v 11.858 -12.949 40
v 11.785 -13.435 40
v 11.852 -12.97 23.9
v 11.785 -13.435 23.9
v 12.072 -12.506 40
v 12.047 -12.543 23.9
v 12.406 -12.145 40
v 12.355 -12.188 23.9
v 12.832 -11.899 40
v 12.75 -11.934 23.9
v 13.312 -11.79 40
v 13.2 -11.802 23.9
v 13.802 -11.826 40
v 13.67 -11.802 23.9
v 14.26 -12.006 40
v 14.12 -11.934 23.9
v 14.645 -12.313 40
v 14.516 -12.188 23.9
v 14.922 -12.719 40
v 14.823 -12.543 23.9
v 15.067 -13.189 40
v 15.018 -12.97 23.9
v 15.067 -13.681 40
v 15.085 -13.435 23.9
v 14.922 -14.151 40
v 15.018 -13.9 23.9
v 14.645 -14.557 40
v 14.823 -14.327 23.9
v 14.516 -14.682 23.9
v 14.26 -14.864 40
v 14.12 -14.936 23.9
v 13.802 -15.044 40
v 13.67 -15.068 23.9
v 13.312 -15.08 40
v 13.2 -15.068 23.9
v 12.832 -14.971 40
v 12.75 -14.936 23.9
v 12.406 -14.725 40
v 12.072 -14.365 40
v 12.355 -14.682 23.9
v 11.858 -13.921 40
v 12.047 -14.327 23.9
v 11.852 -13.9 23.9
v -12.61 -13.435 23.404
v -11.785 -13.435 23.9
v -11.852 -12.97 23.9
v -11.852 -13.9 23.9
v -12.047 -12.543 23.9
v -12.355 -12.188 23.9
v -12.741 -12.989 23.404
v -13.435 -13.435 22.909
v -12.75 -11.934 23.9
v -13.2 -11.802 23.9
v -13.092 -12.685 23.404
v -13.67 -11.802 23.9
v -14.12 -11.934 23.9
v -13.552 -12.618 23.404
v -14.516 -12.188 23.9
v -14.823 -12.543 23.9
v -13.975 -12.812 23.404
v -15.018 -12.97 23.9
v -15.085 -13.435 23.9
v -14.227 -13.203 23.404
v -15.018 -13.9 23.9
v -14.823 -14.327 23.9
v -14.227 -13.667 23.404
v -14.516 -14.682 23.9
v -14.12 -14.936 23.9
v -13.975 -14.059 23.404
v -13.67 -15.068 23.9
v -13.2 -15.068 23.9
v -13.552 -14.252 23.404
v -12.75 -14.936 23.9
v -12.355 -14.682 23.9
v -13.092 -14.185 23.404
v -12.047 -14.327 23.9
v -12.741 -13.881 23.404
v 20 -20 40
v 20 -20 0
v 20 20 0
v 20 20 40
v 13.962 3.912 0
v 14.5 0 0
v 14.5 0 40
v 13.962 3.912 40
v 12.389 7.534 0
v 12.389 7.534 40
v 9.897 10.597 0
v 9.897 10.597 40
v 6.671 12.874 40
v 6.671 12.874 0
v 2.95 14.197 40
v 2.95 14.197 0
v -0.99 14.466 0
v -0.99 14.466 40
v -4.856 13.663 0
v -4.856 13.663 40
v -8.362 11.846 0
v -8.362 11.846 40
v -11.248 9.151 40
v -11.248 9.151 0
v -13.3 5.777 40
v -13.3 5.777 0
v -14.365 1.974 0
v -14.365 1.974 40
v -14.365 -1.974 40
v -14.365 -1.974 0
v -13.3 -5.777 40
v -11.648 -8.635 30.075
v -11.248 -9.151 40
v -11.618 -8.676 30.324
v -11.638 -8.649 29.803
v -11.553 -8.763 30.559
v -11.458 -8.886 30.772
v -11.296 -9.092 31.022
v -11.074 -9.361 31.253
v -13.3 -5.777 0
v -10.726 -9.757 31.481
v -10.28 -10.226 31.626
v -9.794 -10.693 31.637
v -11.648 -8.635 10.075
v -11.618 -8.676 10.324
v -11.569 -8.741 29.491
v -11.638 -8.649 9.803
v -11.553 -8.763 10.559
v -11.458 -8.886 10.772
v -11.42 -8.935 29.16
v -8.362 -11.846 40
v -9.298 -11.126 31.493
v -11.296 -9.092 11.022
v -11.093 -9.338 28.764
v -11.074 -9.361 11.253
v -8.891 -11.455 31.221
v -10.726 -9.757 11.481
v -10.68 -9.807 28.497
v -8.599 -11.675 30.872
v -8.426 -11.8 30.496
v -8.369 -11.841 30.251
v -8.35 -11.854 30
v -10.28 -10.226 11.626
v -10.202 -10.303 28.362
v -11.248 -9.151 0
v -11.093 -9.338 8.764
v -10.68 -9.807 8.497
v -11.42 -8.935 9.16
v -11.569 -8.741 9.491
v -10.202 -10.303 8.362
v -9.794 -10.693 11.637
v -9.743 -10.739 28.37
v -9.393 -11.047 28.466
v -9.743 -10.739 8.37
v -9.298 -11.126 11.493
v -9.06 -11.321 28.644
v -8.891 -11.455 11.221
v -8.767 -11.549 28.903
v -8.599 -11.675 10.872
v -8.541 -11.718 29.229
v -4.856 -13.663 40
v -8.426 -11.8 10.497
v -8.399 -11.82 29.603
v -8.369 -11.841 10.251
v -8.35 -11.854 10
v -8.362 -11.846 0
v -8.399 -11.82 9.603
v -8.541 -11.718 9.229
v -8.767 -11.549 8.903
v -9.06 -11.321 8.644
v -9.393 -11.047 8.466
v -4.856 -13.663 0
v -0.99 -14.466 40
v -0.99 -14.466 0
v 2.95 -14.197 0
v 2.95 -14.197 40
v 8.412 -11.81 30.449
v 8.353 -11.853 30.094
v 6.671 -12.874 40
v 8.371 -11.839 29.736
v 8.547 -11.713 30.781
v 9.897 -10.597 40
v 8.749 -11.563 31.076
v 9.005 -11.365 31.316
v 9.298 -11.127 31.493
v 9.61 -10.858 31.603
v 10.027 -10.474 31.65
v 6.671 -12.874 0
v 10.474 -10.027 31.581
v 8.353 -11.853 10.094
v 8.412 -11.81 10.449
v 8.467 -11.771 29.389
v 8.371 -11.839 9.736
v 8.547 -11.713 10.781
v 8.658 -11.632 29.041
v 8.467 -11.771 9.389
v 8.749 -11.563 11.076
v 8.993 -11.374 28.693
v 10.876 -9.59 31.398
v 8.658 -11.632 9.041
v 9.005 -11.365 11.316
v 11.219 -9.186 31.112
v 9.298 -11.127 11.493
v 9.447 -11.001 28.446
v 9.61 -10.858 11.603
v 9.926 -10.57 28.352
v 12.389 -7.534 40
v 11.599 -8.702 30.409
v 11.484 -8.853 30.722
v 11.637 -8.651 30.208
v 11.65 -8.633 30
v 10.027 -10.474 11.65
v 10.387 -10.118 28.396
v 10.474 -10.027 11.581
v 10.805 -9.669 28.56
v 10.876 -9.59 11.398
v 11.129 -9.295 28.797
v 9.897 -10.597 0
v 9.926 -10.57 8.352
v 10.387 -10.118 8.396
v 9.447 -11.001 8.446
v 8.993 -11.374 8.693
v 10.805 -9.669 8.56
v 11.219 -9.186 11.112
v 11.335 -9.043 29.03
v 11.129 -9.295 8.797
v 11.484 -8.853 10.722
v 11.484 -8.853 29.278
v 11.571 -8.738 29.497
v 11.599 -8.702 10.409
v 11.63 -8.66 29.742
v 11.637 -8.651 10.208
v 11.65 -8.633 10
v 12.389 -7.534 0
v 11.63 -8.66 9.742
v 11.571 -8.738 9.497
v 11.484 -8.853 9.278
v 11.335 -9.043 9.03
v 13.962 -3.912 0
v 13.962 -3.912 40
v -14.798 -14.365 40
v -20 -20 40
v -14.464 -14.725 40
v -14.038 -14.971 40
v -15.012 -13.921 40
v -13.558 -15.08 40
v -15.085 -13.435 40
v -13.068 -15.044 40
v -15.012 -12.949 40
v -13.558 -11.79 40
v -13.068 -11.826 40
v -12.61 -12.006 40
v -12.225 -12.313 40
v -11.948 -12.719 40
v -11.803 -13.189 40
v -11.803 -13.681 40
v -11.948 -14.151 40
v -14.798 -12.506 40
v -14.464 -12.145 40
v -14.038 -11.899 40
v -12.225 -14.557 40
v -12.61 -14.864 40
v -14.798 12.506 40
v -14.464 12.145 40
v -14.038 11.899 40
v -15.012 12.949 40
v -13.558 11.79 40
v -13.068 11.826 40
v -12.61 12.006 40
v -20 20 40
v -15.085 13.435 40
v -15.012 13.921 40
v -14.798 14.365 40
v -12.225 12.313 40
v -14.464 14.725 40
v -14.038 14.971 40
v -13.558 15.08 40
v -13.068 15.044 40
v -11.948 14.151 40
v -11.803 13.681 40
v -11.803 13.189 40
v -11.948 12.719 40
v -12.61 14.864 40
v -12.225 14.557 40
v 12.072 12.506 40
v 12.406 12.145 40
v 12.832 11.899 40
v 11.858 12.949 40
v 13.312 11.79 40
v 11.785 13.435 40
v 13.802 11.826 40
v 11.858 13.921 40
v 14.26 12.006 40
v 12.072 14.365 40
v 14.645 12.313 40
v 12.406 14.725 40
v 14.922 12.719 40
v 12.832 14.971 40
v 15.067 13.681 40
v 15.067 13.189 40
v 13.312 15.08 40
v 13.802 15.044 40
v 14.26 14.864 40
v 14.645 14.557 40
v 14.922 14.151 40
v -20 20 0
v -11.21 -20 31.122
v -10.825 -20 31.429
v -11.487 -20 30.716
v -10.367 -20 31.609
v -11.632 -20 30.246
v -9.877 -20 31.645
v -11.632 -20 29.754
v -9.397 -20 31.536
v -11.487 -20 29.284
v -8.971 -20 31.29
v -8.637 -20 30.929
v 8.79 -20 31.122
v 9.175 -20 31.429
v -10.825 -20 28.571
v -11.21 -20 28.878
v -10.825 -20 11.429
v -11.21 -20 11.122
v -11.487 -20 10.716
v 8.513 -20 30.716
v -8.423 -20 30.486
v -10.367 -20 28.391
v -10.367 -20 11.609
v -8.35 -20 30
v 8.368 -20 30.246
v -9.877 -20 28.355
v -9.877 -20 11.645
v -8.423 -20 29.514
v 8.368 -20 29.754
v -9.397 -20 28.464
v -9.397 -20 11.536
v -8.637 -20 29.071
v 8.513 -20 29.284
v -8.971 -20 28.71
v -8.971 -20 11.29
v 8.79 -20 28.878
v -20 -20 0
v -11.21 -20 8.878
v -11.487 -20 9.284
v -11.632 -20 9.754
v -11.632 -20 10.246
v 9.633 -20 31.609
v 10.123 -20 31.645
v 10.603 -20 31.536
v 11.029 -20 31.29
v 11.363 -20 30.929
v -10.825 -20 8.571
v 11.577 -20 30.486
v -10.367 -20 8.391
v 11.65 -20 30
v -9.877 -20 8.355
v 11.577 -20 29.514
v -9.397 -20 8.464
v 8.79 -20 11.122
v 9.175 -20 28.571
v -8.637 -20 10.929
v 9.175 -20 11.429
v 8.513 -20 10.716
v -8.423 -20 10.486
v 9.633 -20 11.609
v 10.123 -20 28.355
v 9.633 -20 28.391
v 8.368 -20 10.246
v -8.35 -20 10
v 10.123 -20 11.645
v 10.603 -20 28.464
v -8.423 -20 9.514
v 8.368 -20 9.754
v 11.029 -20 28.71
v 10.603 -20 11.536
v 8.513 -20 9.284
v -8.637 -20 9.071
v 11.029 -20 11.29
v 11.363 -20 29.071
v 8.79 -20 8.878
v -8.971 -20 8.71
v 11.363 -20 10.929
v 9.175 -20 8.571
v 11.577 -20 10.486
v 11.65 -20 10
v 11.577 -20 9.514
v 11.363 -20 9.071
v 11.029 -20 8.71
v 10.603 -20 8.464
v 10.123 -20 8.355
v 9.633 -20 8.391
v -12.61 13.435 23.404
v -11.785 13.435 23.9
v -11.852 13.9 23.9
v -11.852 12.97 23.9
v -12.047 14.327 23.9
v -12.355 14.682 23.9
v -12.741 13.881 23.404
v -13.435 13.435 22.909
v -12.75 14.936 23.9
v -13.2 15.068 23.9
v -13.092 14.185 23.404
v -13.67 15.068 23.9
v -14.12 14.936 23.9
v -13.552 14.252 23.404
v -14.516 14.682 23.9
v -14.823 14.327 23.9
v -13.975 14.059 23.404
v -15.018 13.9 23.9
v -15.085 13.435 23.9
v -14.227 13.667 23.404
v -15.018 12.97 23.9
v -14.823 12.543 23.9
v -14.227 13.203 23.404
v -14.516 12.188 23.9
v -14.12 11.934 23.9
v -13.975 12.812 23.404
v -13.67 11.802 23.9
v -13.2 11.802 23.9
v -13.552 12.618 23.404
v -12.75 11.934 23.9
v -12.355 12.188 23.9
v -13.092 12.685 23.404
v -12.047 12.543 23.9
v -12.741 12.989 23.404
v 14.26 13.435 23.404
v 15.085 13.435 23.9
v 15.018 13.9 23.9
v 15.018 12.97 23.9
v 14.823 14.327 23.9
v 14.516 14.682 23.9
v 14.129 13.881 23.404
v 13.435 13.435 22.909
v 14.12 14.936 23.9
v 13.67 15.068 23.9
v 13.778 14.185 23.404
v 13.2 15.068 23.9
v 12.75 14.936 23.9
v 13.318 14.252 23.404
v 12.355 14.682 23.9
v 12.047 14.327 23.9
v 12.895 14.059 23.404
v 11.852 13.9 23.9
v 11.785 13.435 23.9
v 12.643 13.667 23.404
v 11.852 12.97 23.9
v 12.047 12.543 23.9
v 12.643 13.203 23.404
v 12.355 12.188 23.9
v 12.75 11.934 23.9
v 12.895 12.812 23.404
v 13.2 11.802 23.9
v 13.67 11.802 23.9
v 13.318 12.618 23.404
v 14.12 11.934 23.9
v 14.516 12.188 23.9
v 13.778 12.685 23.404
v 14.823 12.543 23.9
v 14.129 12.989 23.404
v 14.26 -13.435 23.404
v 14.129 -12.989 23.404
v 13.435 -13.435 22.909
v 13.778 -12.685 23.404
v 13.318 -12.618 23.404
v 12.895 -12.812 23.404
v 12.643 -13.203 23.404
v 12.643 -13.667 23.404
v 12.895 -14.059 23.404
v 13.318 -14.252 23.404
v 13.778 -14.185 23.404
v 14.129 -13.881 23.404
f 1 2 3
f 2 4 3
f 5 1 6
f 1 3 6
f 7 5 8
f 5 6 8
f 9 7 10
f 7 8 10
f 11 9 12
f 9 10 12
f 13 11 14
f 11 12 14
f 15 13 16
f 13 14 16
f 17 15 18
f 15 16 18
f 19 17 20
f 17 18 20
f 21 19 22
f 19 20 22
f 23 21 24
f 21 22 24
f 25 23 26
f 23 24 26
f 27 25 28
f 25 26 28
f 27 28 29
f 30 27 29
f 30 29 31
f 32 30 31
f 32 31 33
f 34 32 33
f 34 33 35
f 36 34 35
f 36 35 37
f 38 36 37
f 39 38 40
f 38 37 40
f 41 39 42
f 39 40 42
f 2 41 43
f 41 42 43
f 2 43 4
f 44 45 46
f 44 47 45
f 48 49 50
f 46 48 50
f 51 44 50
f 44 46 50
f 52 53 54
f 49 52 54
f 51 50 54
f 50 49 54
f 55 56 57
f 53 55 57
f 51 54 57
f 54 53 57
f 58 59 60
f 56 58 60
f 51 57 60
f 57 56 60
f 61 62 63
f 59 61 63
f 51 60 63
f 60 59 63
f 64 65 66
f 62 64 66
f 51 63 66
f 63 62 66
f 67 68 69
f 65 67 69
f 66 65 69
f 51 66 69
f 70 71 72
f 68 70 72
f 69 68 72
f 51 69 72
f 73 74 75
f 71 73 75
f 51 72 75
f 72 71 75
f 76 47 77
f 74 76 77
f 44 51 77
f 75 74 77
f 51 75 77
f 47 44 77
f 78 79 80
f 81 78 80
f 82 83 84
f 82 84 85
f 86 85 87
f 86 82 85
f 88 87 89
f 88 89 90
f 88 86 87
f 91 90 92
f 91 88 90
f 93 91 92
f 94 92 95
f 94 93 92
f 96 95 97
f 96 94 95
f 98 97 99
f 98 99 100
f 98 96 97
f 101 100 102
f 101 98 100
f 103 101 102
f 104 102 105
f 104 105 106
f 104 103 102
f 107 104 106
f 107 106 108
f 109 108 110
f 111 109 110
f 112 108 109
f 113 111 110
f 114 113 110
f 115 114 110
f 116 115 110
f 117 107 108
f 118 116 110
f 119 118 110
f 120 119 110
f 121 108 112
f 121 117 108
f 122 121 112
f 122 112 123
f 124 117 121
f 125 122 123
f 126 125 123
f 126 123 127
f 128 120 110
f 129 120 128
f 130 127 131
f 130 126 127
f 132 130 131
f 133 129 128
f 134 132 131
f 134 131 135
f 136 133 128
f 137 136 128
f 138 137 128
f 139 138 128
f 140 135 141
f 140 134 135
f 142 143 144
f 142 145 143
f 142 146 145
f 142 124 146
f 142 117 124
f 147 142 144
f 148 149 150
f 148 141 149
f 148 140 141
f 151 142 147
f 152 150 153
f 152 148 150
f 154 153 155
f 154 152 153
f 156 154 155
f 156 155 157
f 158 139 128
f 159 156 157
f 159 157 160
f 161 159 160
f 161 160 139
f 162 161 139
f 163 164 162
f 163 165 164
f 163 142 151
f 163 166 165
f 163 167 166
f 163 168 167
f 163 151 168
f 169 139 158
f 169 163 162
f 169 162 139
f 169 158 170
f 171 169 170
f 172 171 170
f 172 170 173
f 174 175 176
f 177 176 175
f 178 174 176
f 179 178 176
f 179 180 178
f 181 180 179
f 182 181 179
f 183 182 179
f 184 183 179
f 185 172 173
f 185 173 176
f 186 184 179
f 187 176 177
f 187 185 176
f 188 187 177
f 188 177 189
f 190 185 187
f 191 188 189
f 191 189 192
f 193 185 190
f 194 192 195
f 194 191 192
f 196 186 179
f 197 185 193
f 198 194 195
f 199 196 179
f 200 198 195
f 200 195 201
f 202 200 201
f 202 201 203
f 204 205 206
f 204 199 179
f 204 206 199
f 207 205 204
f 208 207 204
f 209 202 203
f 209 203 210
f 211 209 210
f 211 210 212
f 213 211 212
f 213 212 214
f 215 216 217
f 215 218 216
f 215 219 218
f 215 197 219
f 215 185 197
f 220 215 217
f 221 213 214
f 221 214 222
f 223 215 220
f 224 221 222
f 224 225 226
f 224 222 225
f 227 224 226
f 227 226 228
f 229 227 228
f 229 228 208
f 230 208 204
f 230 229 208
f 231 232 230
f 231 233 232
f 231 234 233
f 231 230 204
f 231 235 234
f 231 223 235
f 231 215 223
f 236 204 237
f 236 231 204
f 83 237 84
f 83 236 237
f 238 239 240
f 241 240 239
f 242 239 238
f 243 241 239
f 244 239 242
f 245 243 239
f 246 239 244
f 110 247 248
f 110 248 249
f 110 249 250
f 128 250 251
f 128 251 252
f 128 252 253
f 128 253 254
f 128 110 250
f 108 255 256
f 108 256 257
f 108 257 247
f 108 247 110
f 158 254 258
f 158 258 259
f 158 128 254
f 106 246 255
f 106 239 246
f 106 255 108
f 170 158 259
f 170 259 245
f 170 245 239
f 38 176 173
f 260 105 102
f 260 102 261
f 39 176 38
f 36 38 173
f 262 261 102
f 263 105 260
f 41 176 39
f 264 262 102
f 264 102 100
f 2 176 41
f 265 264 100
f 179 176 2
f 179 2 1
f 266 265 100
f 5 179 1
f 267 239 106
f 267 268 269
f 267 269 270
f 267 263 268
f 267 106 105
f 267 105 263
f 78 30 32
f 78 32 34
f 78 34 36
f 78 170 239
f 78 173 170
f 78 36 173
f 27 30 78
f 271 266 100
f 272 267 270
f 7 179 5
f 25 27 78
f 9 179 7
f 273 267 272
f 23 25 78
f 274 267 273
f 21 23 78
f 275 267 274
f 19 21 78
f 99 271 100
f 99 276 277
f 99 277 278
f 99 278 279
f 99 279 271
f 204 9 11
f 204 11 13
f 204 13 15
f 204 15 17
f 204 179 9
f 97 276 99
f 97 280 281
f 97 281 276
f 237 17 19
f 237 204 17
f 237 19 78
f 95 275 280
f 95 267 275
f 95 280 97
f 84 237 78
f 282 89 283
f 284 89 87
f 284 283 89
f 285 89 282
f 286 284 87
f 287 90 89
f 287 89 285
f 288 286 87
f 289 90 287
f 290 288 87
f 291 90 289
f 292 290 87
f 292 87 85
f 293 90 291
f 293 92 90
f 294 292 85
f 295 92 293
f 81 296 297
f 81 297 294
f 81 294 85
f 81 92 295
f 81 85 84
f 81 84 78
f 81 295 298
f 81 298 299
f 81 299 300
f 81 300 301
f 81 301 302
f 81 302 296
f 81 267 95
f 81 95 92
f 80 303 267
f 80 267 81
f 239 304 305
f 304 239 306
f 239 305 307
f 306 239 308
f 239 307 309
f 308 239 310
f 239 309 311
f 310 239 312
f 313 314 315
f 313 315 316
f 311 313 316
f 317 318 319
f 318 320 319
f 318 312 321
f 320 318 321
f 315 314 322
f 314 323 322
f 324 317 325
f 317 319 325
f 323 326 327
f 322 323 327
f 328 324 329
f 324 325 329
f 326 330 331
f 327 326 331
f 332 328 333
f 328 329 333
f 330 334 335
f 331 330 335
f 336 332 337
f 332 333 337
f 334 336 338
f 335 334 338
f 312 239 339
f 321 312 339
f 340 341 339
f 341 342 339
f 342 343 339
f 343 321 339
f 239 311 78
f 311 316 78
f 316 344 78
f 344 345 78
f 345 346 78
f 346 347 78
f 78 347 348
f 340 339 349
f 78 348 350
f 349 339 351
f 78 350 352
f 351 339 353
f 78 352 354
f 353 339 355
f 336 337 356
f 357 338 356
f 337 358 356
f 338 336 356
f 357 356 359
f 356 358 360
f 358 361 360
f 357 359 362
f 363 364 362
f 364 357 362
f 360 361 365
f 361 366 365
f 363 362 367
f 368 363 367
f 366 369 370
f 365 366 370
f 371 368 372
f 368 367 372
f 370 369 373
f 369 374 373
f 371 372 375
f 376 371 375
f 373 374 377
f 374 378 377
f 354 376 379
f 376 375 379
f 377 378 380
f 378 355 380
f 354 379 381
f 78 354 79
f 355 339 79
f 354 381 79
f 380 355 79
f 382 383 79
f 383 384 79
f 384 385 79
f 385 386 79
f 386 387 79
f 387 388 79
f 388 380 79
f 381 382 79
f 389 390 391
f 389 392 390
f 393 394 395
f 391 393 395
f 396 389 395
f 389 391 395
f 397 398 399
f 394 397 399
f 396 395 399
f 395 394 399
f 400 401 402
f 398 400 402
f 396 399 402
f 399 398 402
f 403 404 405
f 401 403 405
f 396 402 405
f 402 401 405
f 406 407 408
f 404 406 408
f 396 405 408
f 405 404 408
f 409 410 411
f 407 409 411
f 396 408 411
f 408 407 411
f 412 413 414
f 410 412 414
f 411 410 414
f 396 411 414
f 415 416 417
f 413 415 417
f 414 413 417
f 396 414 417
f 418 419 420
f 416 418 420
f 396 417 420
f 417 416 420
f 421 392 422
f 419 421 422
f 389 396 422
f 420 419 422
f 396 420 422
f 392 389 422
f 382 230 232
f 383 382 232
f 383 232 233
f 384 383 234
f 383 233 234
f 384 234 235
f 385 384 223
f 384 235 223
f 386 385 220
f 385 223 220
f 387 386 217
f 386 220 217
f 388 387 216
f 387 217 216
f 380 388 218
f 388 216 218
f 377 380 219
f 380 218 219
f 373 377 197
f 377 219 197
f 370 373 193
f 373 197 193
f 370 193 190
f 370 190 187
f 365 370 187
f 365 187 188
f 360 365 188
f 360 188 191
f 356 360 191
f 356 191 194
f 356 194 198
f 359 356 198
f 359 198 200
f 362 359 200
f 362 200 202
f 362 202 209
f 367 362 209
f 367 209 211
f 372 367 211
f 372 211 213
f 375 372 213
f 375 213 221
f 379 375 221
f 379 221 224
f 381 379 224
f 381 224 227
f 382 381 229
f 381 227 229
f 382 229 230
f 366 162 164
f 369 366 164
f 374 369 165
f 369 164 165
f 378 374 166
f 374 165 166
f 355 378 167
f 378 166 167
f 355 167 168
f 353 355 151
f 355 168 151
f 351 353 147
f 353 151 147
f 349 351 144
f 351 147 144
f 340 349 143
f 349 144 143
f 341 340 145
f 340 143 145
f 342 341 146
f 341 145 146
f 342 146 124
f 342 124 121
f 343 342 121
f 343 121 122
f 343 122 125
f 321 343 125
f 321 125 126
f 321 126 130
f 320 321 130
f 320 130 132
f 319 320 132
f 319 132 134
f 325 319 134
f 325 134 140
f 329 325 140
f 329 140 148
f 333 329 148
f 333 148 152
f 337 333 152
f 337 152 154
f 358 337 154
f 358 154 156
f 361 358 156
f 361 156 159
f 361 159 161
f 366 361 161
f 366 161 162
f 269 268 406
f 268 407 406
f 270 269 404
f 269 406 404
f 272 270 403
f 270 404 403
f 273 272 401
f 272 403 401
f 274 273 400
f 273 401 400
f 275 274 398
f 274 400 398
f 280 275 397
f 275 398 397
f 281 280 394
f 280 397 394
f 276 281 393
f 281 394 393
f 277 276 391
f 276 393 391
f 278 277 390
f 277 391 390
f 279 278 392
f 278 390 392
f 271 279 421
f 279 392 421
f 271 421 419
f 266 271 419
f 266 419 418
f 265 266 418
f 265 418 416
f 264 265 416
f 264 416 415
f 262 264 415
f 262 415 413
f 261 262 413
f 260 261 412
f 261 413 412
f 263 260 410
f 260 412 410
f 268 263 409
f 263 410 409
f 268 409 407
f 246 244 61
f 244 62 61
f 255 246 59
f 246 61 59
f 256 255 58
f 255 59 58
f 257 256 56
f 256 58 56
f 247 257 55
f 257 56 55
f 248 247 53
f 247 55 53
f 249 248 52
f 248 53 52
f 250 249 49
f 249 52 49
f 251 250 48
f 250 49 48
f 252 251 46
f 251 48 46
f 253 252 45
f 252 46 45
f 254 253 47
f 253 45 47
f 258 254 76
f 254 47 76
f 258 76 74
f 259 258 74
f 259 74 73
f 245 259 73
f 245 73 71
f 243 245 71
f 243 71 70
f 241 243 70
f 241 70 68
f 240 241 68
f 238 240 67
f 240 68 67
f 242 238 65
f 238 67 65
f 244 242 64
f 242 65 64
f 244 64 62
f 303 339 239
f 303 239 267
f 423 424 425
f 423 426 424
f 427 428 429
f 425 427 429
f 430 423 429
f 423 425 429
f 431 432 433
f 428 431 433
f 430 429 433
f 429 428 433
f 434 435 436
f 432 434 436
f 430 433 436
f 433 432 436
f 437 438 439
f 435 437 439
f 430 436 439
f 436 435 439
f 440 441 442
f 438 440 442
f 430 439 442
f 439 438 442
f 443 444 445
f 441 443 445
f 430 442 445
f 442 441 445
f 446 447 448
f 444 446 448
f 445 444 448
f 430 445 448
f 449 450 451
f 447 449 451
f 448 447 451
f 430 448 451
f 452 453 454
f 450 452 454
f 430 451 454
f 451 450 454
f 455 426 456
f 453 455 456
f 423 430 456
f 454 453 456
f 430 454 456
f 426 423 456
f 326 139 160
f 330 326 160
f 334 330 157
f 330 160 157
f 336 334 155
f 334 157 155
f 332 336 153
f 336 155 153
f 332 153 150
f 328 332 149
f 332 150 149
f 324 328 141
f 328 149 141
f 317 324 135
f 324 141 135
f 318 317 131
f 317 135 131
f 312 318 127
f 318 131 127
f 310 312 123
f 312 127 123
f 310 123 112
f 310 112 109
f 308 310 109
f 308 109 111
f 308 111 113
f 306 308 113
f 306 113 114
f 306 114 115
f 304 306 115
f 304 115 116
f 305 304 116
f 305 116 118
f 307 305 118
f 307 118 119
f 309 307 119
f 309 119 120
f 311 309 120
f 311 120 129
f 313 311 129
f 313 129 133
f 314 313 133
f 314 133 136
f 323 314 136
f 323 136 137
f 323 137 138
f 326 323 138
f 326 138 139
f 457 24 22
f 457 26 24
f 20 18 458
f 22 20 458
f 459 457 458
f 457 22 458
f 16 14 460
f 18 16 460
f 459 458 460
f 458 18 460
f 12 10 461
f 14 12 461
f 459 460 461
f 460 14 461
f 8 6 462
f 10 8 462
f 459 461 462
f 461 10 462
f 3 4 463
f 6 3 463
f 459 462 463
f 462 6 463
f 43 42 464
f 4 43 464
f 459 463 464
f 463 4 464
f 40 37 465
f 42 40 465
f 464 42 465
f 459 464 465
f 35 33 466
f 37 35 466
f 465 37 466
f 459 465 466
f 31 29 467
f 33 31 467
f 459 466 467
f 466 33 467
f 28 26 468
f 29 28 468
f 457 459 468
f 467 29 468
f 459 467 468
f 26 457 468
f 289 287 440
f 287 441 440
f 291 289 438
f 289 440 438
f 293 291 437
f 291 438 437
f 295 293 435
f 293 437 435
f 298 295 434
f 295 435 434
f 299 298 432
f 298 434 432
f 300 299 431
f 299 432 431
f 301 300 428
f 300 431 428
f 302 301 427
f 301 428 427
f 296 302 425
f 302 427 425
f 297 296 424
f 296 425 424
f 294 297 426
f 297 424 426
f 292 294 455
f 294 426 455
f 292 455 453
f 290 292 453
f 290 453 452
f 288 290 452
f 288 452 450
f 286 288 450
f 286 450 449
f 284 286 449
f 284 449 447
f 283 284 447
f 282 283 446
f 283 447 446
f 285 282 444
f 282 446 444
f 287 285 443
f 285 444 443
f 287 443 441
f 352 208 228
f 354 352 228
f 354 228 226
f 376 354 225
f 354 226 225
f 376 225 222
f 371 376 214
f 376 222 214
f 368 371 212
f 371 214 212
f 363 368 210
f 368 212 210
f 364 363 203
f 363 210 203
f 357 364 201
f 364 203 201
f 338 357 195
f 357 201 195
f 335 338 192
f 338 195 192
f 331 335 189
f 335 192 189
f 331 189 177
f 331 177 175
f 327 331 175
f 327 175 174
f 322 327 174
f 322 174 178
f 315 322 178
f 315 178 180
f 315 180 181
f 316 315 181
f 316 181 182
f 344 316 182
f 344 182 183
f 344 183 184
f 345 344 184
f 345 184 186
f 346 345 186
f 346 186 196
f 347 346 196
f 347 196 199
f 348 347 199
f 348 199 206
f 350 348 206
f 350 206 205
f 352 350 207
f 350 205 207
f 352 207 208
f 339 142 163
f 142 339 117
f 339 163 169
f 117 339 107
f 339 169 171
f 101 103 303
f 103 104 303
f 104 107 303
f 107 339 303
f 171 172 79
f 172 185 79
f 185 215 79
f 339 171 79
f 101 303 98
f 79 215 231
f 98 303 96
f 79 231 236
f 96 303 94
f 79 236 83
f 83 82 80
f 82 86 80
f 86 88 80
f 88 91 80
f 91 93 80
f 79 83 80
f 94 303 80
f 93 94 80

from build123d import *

# Parameters (mm, degrees)
SKETCH1_W             = 40
SKETCH1_H             = 40
SKETCH1_R             = 14.5
BOSS_EXTRUDE1_DEPTH   = 40
M4_TAPPED_HOLE1_D     = 3.3
M4_TAPPED_HOLE1_DEPTH = 16.1
M4_TAPPED_HOLE1_TIP   = 0.991420021
M4_TAPPED_HOLE2_D     = 3.3
M4_TAPPED_HOLE2_DEPTH = 16.1
M4_TAPPED_HOLE2_TIP   = 0.991420021


with BuildPart() as part:
    # Sketch1 → Boss-Extrude1 (new body)
    with BuildSketch(Plane.XY):
        Rectangle(SKETCH1_W, SKETCH1_H)
        Circle(SKETCH1_R, mode=Mode.SUBTRACT)
    extrude(amount=BOSS_EXTRUDE1_DEPTH)

    # M4 Tapped Hole1
    with Locations(Plane(origin=(-13.435028843, 13.435028843, 40), x_dir=(1, 0, 0), z_dir=(0, 0, 1))):
        with Locations((0, 0), (26.870057686, 0), (26.870057686, -26.870057686), (0, -26.870057686)):
            Hole(M4_TAPPED_HOLE1_D / 2, depth=M4_TAPPED_HOLE1_DEPTH)
            with Locations((0, 0, -(M4_TAPPED_HOLE1_DEPTH + M4_TAPPED_HOLE1_TIP / 2))):  # 118° drill point
                Cone(0, M4_TAPPED_HOLE1_D / 2, M4_TAPPED_HOLE1_TIP, mode=Mode.SUBTRACT)

    # M4 Tapped Hole2
    with Locations(Plane(origin=(-10, -20, 30), x_dir=(-1, 0, 0), z_dir=(0, -1, 0))):
        with Locations((0, 0), (-20, 0), (-20, 20), (0, 20)):
            Hole(M4_TAPPED_HOLE2_D / 2, depth=M4_TAPPED_HOLE2_DEPTH)
            with Locations((0, 0, -(M4_TAPPED_HOLE2_DEPTH + M4_TAPPED_HOLE2_TIP / 2))):  # 118° drill point
                Cone(0, M4_TAPPED_HOLE2_D / 2, M4_TAPPED_HOLE2_TIP, mode=Mode.SUBTRACT)


solid = part.part
